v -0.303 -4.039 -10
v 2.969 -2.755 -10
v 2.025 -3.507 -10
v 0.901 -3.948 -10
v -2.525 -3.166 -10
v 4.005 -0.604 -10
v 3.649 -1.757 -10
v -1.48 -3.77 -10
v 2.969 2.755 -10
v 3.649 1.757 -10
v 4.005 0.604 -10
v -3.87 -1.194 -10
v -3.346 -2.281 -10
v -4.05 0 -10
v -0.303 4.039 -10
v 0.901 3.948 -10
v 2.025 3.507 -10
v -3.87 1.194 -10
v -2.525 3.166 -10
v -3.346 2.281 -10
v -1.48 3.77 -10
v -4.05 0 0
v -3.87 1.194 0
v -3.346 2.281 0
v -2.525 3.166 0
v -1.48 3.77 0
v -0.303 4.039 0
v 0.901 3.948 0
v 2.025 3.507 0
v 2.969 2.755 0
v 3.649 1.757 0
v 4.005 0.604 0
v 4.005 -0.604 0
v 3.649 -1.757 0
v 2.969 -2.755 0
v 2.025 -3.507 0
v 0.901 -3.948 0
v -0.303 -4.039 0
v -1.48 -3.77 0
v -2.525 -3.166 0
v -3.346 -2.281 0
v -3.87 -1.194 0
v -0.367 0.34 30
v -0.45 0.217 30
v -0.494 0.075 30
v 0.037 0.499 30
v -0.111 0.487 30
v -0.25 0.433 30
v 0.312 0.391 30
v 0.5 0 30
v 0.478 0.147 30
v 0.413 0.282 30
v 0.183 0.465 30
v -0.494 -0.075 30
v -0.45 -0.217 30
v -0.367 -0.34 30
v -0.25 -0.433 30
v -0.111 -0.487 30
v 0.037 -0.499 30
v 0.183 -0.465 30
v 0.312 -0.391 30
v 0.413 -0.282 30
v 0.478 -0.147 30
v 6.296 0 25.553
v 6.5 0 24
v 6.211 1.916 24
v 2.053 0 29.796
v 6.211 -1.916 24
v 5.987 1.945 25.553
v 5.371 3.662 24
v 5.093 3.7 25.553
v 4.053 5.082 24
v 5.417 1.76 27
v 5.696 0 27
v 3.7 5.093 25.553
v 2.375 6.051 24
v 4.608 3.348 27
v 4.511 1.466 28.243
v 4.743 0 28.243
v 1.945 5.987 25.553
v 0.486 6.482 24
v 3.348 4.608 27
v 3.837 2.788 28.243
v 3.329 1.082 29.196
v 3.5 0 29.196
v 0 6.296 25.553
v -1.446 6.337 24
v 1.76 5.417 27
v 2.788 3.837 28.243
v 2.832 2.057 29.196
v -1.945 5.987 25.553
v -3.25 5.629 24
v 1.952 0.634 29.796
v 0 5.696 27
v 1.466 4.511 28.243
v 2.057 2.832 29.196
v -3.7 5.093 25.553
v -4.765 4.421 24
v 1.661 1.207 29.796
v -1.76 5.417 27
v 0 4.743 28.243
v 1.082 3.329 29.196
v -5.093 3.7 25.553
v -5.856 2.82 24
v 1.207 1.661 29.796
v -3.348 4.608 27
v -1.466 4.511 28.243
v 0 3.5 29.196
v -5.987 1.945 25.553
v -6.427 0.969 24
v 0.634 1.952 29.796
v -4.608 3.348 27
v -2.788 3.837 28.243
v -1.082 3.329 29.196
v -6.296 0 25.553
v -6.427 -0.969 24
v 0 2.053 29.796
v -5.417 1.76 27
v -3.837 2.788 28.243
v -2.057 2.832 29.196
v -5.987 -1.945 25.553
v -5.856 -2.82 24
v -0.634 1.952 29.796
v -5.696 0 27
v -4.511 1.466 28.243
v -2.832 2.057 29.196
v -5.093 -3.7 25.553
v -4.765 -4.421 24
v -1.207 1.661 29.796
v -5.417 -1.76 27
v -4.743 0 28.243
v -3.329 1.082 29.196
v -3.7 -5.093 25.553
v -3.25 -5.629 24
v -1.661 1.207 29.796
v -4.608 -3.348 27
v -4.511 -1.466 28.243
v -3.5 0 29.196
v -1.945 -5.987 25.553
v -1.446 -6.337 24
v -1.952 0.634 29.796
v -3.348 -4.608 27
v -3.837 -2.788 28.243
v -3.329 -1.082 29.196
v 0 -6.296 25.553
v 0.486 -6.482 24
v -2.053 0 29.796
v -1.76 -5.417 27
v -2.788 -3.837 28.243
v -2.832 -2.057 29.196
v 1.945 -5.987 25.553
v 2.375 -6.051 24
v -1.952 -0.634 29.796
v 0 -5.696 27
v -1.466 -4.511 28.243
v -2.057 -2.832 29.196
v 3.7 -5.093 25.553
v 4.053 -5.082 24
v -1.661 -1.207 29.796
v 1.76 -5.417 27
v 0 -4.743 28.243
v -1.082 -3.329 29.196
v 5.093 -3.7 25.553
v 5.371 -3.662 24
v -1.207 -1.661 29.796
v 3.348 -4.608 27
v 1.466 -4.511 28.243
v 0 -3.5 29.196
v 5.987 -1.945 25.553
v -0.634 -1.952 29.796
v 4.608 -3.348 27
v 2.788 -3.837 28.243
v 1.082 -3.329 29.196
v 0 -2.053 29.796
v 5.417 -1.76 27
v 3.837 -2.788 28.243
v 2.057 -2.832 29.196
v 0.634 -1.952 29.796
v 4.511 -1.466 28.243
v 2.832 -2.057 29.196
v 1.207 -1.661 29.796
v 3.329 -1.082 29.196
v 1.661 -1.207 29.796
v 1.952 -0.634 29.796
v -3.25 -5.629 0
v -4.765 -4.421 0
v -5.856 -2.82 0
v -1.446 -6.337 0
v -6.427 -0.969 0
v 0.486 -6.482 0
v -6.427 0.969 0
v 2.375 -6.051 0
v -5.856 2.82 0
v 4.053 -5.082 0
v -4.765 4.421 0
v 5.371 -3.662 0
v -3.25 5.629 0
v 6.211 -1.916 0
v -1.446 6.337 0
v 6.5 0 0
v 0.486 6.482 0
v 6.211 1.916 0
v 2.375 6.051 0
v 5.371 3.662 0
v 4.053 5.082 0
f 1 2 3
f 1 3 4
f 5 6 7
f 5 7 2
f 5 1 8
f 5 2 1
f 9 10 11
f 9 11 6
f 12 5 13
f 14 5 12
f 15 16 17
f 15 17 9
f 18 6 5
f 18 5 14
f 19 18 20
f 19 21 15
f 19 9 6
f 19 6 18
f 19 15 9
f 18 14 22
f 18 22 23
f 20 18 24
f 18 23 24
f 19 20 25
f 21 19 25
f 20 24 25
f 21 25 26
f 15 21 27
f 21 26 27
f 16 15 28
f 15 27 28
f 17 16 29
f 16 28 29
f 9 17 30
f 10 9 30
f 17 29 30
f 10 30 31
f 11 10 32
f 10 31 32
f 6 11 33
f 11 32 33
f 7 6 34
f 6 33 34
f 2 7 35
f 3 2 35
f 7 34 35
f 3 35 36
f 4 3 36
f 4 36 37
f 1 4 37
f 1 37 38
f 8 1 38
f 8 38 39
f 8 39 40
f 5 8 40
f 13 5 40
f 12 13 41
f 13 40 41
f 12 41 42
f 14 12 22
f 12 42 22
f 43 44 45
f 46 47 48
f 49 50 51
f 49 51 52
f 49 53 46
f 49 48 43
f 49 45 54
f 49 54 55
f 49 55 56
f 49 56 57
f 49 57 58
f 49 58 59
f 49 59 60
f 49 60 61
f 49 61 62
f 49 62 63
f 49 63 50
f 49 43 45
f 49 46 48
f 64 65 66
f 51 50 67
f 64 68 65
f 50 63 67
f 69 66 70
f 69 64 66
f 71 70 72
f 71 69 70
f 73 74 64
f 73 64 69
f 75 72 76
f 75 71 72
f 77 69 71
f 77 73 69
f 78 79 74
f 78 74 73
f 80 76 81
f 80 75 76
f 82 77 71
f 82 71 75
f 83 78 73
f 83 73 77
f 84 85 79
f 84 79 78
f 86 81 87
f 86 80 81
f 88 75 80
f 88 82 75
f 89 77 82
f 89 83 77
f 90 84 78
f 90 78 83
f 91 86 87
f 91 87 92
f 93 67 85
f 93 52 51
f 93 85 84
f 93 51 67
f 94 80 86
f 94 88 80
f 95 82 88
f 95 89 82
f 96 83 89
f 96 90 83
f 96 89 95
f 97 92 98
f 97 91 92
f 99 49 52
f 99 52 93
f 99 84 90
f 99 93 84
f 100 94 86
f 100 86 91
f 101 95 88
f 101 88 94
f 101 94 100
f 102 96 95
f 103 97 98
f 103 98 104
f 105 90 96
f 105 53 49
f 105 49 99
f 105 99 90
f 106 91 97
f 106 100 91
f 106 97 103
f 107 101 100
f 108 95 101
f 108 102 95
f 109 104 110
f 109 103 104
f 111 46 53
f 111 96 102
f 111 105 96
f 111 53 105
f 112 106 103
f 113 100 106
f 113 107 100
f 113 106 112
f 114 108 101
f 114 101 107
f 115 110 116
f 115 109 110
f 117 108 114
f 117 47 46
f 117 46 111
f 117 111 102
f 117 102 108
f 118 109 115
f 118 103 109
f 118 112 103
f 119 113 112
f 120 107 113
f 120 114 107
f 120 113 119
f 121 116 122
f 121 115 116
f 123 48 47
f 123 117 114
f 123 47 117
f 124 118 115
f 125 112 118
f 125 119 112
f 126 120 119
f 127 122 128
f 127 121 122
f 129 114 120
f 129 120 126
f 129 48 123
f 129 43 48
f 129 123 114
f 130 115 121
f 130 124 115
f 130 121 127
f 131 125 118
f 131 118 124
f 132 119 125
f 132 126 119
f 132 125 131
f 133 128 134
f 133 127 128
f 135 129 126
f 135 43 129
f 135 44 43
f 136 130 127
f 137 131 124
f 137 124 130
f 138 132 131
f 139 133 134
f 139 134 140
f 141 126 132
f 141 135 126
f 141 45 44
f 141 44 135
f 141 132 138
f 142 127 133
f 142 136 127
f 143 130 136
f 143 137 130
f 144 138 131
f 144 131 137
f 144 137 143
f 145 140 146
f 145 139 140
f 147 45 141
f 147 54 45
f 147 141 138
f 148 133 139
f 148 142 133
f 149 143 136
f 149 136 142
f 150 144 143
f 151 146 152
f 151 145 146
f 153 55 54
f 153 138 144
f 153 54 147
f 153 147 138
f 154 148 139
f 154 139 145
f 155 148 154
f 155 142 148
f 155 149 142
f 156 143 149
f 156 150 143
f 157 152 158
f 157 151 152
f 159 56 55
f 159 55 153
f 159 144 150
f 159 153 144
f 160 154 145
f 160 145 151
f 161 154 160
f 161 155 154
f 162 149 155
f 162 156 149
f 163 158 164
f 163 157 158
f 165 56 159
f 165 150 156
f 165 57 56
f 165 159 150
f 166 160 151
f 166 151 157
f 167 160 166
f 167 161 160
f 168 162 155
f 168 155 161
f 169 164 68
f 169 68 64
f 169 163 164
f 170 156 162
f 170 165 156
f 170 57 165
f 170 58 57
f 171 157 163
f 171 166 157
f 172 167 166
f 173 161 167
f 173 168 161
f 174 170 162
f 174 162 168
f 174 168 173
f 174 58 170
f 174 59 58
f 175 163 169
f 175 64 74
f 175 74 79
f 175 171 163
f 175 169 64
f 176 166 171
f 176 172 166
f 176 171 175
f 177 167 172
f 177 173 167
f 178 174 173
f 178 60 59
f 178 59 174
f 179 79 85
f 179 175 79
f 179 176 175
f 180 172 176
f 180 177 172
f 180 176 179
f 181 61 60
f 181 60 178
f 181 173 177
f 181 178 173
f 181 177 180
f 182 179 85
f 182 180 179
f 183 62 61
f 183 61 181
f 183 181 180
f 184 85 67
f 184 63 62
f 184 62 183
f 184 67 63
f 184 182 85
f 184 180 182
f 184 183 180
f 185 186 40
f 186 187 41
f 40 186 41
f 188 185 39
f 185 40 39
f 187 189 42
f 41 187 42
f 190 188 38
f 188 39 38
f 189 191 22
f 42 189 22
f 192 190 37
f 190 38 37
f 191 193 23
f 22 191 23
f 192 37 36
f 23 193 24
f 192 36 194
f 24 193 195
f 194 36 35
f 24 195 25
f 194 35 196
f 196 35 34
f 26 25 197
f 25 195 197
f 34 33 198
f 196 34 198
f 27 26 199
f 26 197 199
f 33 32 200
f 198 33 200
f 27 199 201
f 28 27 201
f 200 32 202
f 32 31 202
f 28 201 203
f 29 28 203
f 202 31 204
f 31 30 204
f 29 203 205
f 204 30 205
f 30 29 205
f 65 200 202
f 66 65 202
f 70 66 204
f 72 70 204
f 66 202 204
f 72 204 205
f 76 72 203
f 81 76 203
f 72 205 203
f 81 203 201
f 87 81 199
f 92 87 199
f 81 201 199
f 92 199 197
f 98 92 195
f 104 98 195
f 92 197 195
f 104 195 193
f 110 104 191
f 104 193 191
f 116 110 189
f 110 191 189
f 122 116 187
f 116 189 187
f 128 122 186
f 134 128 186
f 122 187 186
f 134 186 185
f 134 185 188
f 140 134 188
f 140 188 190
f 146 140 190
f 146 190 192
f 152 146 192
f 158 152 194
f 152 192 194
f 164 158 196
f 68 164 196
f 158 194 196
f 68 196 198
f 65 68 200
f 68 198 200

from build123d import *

# Parameters (mm, degrees)
ESQUISSE1_R        = 6.5
BOSS_EXTRU_1_DEPTH = 30
ESQUISSE2_R        = 4.05
BOSS_EXTRU_2_DEPTH = 10
CONG_4_R           = 6


with BuildPart() as part:
    # Esquisse1 → Boss.-Extru.1 (new body)
    with BuildSketch(Plane.XY):
        Circle(ESQUISSE1_R)
    extrude(amount=BOSS_EXTRU_1_DEPTH)

    # Esquisse2 → Boss.-Extru.2 (add)
    with BuildSketch(Plane(origin=(0, 0, 0), x_dir=(-1, 0, 0), z_dir=(0, 0, -1))):
        Circle(ESQUISSE2_R)
    extrude(amount=BOSS_EXTRU_2_DEPTH)

    # Congé4
    cong_4_edges = [part.edges().sort_by_distance(p)[0] for p in [
        (-6.5, 0, 30),
    ]]
    fillet(cong_4_edges, radius=CONG_4_R)


solid = part.part
